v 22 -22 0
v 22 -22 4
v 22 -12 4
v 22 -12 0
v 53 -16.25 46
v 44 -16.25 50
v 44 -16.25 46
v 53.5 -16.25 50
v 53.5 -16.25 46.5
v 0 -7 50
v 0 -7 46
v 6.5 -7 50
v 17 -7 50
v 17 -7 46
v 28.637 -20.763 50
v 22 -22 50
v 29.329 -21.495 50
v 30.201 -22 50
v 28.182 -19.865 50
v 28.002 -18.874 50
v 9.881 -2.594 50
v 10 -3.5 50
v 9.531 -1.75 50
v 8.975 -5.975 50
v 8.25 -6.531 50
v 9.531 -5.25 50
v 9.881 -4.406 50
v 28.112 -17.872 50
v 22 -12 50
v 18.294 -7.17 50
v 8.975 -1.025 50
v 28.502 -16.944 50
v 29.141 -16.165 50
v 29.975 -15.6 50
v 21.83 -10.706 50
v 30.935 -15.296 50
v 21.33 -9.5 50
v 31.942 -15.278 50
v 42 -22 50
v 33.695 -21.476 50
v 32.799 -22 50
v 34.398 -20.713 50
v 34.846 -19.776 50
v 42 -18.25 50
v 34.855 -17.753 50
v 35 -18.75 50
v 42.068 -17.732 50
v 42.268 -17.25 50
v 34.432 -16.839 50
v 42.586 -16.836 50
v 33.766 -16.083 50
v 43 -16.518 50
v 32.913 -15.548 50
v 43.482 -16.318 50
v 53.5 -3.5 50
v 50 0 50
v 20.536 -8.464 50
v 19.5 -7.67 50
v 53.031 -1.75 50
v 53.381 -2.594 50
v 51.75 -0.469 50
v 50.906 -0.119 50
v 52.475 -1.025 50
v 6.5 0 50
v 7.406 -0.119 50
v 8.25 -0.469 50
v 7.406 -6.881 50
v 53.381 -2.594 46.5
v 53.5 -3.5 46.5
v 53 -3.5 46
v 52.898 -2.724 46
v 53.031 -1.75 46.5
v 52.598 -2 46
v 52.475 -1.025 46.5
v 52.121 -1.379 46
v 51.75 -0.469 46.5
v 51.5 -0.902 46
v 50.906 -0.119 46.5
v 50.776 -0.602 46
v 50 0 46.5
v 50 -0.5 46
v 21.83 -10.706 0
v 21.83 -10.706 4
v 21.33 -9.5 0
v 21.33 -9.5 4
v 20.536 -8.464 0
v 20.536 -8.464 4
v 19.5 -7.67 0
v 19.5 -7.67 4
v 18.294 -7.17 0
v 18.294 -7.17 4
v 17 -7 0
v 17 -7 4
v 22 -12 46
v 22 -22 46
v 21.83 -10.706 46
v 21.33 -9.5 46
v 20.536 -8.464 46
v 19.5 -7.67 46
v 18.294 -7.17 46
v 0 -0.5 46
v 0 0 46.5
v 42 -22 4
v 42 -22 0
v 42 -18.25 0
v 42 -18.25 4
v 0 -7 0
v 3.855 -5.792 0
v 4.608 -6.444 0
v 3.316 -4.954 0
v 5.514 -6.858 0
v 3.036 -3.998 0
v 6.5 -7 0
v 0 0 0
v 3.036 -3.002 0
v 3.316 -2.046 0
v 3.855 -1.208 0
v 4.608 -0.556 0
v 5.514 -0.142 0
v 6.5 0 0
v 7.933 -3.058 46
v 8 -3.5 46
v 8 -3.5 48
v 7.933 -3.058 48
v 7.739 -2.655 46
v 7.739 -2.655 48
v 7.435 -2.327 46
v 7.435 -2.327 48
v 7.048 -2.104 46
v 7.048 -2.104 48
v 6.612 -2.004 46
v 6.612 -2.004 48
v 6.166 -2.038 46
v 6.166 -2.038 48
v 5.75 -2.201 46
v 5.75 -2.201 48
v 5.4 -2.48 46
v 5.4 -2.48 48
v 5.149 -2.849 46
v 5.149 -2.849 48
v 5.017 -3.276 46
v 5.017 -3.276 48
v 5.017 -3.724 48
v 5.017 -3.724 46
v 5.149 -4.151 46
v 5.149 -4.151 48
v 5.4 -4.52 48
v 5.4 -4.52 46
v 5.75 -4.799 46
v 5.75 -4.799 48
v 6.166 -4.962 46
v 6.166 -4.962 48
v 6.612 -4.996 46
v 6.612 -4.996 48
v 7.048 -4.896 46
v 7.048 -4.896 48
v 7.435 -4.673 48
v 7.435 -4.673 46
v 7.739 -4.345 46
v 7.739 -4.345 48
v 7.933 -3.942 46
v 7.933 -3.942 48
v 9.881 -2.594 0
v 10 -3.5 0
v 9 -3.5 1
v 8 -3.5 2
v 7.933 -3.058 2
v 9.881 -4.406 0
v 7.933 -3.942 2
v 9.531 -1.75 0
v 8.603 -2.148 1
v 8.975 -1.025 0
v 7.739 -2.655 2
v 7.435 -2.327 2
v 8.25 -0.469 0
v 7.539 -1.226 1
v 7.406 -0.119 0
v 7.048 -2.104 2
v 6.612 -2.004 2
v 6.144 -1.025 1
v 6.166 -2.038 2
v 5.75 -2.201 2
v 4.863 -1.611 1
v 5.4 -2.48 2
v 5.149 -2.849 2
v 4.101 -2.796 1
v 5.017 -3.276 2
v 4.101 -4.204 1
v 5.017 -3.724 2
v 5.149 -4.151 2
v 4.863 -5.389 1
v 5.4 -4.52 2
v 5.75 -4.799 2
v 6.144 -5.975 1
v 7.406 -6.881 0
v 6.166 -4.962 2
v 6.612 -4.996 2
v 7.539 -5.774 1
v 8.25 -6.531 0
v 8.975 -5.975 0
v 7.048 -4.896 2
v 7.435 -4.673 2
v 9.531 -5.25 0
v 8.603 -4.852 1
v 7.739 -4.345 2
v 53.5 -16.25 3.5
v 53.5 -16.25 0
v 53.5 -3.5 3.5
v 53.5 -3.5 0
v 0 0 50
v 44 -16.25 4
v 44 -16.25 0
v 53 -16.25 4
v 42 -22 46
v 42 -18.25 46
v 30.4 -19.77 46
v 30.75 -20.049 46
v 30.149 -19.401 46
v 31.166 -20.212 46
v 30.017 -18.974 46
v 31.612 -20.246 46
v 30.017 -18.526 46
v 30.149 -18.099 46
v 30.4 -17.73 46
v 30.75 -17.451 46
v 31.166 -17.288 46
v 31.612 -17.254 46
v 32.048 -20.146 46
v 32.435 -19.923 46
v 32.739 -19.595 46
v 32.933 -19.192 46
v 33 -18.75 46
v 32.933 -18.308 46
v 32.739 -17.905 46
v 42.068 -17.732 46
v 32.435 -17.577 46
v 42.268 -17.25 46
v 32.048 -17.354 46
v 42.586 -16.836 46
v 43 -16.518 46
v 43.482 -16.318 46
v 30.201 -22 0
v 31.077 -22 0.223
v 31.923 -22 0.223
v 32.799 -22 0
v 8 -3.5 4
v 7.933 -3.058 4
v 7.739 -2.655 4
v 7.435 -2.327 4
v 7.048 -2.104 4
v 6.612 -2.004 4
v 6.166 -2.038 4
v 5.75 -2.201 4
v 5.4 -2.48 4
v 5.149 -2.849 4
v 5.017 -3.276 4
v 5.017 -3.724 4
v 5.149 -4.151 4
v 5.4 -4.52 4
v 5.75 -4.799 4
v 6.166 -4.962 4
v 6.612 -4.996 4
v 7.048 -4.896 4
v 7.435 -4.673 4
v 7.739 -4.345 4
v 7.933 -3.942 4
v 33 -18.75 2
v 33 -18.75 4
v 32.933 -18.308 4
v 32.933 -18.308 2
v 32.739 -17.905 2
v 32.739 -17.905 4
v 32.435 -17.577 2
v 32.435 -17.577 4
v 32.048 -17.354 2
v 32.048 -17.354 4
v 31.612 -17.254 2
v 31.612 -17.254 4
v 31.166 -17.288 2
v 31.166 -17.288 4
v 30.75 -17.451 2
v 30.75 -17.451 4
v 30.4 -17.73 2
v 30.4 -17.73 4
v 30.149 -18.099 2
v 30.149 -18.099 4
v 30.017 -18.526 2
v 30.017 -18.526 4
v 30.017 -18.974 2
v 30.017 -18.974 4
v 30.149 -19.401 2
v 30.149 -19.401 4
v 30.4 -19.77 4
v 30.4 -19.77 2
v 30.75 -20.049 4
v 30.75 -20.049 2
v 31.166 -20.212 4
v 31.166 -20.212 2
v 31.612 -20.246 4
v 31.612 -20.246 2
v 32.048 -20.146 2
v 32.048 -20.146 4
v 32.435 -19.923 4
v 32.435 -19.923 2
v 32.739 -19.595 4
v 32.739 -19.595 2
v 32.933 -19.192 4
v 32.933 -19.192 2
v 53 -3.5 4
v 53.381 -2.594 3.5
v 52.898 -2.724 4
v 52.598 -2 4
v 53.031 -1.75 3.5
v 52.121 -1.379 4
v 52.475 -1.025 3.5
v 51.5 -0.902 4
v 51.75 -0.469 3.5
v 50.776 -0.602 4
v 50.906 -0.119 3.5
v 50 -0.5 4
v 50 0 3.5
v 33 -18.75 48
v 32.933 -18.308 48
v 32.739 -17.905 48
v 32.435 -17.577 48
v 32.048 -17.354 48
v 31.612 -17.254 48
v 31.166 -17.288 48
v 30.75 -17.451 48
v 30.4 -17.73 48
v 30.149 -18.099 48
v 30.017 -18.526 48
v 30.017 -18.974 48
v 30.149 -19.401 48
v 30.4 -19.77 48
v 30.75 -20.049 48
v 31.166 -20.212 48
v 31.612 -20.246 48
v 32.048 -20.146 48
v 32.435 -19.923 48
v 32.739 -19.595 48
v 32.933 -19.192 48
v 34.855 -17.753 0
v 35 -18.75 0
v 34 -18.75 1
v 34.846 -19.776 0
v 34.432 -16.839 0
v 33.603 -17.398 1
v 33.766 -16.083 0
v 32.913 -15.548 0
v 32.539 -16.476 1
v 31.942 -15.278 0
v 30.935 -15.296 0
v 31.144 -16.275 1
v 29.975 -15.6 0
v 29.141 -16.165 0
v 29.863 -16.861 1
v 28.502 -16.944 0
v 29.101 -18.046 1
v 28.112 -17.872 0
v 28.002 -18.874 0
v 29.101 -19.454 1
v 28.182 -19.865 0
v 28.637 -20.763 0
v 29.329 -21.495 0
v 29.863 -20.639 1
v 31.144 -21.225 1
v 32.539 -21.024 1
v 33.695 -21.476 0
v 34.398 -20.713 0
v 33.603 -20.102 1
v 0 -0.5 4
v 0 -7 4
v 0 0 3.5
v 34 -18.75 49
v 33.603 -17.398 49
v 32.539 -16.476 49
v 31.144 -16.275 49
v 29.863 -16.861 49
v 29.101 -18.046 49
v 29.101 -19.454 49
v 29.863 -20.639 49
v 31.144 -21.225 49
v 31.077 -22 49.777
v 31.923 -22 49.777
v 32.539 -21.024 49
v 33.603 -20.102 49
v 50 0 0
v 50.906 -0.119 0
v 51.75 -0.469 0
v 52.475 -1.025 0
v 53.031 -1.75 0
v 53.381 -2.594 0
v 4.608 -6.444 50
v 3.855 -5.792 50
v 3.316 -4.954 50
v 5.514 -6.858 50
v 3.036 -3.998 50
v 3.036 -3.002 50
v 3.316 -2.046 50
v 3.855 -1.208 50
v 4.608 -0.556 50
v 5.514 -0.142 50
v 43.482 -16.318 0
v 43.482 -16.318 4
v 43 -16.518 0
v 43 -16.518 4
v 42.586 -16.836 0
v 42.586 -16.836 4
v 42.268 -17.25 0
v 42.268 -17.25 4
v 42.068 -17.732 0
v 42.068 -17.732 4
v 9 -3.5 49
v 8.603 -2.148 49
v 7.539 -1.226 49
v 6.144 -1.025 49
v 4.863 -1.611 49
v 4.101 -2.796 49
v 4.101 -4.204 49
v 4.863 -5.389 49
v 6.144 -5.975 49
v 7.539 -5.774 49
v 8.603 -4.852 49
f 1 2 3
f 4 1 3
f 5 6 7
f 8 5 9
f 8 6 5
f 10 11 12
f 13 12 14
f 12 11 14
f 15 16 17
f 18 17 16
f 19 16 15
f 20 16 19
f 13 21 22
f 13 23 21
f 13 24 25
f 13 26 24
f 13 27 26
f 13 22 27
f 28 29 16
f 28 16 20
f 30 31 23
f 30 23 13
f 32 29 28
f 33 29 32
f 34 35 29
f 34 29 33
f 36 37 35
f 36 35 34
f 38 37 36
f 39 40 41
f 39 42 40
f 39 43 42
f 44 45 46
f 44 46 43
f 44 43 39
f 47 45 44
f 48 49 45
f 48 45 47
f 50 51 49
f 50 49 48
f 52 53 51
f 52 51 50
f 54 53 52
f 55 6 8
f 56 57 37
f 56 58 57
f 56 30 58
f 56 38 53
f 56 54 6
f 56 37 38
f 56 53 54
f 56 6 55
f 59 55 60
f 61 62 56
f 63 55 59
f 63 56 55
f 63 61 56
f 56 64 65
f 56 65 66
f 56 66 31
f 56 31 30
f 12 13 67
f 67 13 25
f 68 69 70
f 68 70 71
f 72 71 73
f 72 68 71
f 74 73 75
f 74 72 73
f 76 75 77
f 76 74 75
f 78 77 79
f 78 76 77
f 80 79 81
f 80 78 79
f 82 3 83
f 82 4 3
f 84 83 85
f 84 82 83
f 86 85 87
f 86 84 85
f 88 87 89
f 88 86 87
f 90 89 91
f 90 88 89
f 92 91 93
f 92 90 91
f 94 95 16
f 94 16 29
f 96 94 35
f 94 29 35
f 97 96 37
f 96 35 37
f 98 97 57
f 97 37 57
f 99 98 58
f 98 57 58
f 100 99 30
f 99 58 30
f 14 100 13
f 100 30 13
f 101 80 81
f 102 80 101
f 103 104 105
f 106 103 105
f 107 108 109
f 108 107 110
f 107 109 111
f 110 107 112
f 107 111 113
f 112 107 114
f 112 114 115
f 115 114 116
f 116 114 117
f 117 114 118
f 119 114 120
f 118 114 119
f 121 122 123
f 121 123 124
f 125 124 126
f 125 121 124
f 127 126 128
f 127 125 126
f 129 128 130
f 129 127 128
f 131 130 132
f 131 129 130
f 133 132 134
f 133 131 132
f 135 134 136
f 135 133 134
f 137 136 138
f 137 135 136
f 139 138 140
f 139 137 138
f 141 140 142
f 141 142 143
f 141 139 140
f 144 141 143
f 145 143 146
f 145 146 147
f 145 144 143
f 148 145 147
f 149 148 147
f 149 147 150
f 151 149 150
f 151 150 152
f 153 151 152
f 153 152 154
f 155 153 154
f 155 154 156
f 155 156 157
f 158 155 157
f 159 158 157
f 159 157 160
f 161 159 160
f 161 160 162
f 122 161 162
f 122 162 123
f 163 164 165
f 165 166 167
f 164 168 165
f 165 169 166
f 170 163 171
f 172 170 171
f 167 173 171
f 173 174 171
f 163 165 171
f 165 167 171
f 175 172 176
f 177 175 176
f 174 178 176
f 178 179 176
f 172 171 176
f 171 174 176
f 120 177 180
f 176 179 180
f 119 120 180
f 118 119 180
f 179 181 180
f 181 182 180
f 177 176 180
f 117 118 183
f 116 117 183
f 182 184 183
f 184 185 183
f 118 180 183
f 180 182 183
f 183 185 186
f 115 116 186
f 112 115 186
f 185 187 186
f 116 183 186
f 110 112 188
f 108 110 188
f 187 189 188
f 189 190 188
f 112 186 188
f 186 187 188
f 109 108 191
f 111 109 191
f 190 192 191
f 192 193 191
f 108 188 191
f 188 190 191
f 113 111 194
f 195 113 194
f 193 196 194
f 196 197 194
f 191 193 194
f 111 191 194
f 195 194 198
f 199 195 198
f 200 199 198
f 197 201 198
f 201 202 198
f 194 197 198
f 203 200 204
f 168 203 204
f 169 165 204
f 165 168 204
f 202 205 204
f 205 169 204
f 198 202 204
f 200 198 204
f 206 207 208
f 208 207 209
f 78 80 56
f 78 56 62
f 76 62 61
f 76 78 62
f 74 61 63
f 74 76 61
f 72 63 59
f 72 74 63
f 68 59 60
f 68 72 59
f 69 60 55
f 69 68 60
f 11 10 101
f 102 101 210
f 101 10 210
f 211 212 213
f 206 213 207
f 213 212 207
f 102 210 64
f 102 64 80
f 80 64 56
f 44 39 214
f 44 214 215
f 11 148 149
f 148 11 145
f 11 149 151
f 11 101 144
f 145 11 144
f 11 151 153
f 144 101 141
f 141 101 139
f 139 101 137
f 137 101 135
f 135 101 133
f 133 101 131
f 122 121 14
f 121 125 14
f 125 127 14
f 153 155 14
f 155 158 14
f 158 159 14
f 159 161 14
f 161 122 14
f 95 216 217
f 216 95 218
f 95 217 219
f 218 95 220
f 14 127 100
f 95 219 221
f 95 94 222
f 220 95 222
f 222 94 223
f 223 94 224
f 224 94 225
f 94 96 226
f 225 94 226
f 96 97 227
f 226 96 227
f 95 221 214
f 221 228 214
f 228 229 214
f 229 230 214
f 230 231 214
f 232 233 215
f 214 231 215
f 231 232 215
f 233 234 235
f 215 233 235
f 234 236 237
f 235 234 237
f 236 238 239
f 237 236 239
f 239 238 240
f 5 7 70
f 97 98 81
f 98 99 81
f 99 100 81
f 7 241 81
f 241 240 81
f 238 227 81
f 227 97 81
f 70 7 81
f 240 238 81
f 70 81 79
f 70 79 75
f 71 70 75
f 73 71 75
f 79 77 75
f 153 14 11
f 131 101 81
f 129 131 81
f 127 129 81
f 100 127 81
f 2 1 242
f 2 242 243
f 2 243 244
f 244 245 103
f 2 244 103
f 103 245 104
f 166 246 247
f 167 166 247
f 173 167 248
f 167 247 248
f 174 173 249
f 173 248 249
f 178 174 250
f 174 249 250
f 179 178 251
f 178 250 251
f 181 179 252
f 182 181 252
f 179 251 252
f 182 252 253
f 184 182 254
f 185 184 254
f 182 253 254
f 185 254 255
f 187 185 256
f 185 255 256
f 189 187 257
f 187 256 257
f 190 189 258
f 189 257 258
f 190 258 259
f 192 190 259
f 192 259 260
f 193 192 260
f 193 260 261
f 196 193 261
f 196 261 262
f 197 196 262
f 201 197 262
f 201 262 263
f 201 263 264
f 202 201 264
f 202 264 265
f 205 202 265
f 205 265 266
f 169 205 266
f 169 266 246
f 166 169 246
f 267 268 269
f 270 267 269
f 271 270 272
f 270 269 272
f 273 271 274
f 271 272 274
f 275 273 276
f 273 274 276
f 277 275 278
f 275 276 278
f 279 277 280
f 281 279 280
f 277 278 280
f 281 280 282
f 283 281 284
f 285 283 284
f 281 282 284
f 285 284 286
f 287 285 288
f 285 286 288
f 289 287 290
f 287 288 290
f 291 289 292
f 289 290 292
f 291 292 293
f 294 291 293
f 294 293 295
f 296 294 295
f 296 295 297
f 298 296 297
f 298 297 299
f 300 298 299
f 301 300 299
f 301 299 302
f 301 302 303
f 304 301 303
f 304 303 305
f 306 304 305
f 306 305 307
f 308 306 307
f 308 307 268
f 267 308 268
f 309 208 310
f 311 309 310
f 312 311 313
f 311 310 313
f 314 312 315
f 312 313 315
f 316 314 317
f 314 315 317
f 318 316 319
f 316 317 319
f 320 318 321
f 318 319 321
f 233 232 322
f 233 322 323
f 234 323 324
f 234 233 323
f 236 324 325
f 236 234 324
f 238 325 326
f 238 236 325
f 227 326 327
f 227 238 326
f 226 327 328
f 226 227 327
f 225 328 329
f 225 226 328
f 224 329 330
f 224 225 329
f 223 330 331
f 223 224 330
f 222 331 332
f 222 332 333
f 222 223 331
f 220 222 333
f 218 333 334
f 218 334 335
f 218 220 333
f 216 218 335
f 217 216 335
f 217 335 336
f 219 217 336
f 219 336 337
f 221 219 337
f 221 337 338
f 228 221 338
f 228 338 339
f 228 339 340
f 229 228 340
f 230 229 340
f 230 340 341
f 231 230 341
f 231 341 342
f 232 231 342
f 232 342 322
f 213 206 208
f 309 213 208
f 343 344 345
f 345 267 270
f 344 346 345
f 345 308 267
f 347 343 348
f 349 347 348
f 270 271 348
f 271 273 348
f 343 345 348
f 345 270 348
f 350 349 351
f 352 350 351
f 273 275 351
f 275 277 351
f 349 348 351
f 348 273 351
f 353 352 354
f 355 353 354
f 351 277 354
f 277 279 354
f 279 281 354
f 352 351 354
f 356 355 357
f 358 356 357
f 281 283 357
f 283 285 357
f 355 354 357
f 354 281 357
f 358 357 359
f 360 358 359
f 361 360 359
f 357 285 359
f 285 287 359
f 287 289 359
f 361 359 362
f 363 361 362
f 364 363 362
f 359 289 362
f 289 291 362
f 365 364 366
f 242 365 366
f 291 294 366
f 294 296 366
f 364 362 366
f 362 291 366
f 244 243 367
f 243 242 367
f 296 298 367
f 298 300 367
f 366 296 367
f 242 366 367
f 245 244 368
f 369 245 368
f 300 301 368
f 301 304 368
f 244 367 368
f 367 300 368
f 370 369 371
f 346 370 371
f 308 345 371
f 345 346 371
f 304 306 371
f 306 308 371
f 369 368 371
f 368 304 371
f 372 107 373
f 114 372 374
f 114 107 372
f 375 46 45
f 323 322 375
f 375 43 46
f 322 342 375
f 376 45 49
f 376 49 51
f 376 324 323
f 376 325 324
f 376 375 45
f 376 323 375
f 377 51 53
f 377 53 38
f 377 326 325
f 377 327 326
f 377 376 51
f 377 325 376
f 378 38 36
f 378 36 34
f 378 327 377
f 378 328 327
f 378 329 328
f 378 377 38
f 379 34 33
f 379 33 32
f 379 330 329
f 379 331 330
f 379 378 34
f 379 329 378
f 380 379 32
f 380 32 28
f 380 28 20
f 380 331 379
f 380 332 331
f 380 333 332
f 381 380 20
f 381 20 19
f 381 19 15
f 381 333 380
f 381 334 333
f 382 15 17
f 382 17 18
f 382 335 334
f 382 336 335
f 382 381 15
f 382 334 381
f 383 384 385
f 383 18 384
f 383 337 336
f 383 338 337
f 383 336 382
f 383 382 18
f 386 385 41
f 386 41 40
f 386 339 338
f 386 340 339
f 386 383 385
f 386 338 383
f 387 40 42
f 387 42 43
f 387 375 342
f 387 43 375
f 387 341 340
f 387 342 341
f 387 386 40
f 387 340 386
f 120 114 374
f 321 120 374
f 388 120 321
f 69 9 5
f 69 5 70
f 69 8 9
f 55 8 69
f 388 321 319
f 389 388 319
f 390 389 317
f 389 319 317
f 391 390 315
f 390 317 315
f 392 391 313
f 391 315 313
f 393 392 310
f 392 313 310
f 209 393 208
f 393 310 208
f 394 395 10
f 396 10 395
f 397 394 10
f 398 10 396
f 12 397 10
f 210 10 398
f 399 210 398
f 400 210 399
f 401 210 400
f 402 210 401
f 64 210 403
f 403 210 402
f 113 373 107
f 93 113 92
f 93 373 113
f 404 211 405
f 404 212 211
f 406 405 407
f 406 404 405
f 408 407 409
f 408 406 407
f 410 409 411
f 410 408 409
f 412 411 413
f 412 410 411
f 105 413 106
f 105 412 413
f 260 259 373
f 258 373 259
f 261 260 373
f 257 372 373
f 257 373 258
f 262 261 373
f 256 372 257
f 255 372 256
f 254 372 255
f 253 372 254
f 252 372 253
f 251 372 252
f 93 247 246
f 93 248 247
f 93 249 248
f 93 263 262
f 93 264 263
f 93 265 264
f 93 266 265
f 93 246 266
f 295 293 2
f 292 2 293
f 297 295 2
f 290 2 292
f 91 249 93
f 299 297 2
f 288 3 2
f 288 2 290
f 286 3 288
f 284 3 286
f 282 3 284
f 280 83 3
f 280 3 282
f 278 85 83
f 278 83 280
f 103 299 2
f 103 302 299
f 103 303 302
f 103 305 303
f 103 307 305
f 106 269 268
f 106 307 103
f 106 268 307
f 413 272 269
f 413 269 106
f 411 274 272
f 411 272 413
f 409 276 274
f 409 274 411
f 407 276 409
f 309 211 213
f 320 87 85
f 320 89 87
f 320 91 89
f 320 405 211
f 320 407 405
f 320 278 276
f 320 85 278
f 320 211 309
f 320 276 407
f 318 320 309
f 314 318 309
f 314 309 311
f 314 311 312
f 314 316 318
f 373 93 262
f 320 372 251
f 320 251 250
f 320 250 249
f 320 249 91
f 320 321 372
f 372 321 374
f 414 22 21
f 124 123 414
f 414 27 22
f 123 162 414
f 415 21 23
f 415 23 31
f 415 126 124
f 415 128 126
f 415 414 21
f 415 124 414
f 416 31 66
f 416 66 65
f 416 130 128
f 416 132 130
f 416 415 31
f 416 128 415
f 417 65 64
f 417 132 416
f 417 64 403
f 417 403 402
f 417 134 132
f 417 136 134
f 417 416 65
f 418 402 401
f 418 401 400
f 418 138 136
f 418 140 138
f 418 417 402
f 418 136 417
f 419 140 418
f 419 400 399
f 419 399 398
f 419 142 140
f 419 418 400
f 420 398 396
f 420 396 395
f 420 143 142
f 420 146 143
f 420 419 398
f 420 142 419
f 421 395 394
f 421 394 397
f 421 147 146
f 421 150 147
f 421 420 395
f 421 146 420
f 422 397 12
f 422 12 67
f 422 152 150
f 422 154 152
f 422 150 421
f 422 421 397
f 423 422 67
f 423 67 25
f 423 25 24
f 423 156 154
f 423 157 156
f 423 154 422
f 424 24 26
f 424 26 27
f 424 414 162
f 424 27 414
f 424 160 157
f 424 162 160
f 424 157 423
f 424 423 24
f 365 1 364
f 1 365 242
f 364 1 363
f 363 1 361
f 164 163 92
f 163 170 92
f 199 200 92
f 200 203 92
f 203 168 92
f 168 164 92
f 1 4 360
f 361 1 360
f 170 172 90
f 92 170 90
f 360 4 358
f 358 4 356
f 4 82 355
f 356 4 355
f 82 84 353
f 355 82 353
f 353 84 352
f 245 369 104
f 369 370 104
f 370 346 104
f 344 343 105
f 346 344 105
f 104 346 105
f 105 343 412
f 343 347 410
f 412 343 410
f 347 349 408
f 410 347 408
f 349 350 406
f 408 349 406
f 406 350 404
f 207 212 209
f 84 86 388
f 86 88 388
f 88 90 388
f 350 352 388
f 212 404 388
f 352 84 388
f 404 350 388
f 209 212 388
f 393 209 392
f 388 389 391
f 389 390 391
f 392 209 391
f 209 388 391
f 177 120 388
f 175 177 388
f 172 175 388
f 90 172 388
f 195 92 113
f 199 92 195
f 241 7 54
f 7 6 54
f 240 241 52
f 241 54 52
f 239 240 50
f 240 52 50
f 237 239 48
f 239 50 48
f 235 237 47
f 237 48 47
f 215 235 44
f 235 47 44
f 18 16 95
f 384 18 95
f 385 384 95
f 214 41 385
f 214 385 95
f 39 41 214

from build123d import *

# Parameters (mm, degrees)
F0_W      = 42
F0_H      = 22
F1_DEPTH  = 4
F2_W      = 29
F2_H      = 16.25
F3_DEPTH  = 4
F4_R      = 3.5
F5_R      = 2
F6_R      = 1.5
F7_DEPTH  = 25
F8_W      = 22
F8_H      = 15
F9_DEPTH  = 25
F10_R     = 5
F11_R     = 1.5
F12_DEPTH = 25
F15_SIZE  = 0.5


# Not quite as in the source:
# - a fillet or chamfer that OpenCascade refuses, or shapes differently, is made with other operations: its cross-section is extruded or revolved along the edge and cut away or added


with BuildPart() as f1:
    # F0 (on Top) → F1 (new body)
    with BuildSketch(Plane.XY):
        with Locations((21, -11)):
            Rectangle(F0_W, F0_H)
    extrude(amount=F1_DEPTH)

    # F2 (on Top) → F3 (join)
    with BuildSketch(Plane.XY):
        with Locations((39, -8.125)):
            Rectangle(F2_W, F2_H)
    extrude(amount=F3_DEPTH)

    # F4
    f4_edges = [f1.edges().sort_by_distance(p)[0] for p in [
        (53.5, 0, 2),
    ]]
    fillet(f4_edges, radius=F4_R)

    # F5
    f5_edges = [f1.edges().sort_by_distance(p)[0] for p in [
        (42, -16.25, 2),
    ]]
    fillet(f5_edges, radius=F5_R)

    # F6 (on face) → F7 (cut)
    with BuildSketch(Plane.XY.offset(4)):
        with Locations((6.5, -3.5)):
            Circle(F6_R)
    extrude(amount=-F7_DEPTH, mode=Mode.SUBTRACT)

    # F8 (on face) → F9 (cut)
    with BuildSketch(Plane.XY.offset(4)):
        with Locations((11, -14.5)):
            Rectangle(F8_W, F8_H)
    extrude(amount=-F9_DEPTH, mode=Mode.SUBTRACT)

    # F10
    f10_edges = [f1.edges().sort_by_distance(p)[0] for p in [
        (22, -7, 2),
    ]]
    fillet(f10_edges, radius=F10_R)

    # F11 (on face) → F12 (cut)
    with BuildSketch(Plane.XY.offset(4)):
        with Locations((31.5, -18.75)):
            Circle(F11_R)
    extrude(amount=-F12_DEPTH, mode=Mode.SUBTRACT)

    # F14: chamfer of 2 on 2 edges, made by hand

    # F14_s1 → F14_t2 (revolve, cut)
    with BuildSketch(Plane.XZ.offset(18.75)):
        Polygon((35, 0), (33, 2), (33, 0), align=None)
    revolve(axis=Axis((31.5, -18.75, 0), (0, 0, 1)), mode=Mode.SUBTRACT)

    # F14_s3 → F14_t4 (revolve, cut)
    with BuildSketch(Plane.XZ.offset(3.5)):
        Polygon((10, 0), (8, 2), (8, 0), align=None)
    revolve(axis=Axis((6.5, -3.5, 0), (0, 0, 1)), mode=Mode.SUBTRACT)

    # F15
    f15_edges = [f1.edges().sort_by_distance(p)[0] for p in [
        (53.5, -9.875, 4),
        (52.474874, -1.025126, 4),
        (25, 0, 4),
    ]]
    chamfer(f15_edges, length=F15_SIZE)


with BuildPart() as f16_1:
    # F16: instance of F1
    add(f1.part.mirror(Plane.XY.offset(25)))


solid = Compound([f1.part, f16_1.part])
